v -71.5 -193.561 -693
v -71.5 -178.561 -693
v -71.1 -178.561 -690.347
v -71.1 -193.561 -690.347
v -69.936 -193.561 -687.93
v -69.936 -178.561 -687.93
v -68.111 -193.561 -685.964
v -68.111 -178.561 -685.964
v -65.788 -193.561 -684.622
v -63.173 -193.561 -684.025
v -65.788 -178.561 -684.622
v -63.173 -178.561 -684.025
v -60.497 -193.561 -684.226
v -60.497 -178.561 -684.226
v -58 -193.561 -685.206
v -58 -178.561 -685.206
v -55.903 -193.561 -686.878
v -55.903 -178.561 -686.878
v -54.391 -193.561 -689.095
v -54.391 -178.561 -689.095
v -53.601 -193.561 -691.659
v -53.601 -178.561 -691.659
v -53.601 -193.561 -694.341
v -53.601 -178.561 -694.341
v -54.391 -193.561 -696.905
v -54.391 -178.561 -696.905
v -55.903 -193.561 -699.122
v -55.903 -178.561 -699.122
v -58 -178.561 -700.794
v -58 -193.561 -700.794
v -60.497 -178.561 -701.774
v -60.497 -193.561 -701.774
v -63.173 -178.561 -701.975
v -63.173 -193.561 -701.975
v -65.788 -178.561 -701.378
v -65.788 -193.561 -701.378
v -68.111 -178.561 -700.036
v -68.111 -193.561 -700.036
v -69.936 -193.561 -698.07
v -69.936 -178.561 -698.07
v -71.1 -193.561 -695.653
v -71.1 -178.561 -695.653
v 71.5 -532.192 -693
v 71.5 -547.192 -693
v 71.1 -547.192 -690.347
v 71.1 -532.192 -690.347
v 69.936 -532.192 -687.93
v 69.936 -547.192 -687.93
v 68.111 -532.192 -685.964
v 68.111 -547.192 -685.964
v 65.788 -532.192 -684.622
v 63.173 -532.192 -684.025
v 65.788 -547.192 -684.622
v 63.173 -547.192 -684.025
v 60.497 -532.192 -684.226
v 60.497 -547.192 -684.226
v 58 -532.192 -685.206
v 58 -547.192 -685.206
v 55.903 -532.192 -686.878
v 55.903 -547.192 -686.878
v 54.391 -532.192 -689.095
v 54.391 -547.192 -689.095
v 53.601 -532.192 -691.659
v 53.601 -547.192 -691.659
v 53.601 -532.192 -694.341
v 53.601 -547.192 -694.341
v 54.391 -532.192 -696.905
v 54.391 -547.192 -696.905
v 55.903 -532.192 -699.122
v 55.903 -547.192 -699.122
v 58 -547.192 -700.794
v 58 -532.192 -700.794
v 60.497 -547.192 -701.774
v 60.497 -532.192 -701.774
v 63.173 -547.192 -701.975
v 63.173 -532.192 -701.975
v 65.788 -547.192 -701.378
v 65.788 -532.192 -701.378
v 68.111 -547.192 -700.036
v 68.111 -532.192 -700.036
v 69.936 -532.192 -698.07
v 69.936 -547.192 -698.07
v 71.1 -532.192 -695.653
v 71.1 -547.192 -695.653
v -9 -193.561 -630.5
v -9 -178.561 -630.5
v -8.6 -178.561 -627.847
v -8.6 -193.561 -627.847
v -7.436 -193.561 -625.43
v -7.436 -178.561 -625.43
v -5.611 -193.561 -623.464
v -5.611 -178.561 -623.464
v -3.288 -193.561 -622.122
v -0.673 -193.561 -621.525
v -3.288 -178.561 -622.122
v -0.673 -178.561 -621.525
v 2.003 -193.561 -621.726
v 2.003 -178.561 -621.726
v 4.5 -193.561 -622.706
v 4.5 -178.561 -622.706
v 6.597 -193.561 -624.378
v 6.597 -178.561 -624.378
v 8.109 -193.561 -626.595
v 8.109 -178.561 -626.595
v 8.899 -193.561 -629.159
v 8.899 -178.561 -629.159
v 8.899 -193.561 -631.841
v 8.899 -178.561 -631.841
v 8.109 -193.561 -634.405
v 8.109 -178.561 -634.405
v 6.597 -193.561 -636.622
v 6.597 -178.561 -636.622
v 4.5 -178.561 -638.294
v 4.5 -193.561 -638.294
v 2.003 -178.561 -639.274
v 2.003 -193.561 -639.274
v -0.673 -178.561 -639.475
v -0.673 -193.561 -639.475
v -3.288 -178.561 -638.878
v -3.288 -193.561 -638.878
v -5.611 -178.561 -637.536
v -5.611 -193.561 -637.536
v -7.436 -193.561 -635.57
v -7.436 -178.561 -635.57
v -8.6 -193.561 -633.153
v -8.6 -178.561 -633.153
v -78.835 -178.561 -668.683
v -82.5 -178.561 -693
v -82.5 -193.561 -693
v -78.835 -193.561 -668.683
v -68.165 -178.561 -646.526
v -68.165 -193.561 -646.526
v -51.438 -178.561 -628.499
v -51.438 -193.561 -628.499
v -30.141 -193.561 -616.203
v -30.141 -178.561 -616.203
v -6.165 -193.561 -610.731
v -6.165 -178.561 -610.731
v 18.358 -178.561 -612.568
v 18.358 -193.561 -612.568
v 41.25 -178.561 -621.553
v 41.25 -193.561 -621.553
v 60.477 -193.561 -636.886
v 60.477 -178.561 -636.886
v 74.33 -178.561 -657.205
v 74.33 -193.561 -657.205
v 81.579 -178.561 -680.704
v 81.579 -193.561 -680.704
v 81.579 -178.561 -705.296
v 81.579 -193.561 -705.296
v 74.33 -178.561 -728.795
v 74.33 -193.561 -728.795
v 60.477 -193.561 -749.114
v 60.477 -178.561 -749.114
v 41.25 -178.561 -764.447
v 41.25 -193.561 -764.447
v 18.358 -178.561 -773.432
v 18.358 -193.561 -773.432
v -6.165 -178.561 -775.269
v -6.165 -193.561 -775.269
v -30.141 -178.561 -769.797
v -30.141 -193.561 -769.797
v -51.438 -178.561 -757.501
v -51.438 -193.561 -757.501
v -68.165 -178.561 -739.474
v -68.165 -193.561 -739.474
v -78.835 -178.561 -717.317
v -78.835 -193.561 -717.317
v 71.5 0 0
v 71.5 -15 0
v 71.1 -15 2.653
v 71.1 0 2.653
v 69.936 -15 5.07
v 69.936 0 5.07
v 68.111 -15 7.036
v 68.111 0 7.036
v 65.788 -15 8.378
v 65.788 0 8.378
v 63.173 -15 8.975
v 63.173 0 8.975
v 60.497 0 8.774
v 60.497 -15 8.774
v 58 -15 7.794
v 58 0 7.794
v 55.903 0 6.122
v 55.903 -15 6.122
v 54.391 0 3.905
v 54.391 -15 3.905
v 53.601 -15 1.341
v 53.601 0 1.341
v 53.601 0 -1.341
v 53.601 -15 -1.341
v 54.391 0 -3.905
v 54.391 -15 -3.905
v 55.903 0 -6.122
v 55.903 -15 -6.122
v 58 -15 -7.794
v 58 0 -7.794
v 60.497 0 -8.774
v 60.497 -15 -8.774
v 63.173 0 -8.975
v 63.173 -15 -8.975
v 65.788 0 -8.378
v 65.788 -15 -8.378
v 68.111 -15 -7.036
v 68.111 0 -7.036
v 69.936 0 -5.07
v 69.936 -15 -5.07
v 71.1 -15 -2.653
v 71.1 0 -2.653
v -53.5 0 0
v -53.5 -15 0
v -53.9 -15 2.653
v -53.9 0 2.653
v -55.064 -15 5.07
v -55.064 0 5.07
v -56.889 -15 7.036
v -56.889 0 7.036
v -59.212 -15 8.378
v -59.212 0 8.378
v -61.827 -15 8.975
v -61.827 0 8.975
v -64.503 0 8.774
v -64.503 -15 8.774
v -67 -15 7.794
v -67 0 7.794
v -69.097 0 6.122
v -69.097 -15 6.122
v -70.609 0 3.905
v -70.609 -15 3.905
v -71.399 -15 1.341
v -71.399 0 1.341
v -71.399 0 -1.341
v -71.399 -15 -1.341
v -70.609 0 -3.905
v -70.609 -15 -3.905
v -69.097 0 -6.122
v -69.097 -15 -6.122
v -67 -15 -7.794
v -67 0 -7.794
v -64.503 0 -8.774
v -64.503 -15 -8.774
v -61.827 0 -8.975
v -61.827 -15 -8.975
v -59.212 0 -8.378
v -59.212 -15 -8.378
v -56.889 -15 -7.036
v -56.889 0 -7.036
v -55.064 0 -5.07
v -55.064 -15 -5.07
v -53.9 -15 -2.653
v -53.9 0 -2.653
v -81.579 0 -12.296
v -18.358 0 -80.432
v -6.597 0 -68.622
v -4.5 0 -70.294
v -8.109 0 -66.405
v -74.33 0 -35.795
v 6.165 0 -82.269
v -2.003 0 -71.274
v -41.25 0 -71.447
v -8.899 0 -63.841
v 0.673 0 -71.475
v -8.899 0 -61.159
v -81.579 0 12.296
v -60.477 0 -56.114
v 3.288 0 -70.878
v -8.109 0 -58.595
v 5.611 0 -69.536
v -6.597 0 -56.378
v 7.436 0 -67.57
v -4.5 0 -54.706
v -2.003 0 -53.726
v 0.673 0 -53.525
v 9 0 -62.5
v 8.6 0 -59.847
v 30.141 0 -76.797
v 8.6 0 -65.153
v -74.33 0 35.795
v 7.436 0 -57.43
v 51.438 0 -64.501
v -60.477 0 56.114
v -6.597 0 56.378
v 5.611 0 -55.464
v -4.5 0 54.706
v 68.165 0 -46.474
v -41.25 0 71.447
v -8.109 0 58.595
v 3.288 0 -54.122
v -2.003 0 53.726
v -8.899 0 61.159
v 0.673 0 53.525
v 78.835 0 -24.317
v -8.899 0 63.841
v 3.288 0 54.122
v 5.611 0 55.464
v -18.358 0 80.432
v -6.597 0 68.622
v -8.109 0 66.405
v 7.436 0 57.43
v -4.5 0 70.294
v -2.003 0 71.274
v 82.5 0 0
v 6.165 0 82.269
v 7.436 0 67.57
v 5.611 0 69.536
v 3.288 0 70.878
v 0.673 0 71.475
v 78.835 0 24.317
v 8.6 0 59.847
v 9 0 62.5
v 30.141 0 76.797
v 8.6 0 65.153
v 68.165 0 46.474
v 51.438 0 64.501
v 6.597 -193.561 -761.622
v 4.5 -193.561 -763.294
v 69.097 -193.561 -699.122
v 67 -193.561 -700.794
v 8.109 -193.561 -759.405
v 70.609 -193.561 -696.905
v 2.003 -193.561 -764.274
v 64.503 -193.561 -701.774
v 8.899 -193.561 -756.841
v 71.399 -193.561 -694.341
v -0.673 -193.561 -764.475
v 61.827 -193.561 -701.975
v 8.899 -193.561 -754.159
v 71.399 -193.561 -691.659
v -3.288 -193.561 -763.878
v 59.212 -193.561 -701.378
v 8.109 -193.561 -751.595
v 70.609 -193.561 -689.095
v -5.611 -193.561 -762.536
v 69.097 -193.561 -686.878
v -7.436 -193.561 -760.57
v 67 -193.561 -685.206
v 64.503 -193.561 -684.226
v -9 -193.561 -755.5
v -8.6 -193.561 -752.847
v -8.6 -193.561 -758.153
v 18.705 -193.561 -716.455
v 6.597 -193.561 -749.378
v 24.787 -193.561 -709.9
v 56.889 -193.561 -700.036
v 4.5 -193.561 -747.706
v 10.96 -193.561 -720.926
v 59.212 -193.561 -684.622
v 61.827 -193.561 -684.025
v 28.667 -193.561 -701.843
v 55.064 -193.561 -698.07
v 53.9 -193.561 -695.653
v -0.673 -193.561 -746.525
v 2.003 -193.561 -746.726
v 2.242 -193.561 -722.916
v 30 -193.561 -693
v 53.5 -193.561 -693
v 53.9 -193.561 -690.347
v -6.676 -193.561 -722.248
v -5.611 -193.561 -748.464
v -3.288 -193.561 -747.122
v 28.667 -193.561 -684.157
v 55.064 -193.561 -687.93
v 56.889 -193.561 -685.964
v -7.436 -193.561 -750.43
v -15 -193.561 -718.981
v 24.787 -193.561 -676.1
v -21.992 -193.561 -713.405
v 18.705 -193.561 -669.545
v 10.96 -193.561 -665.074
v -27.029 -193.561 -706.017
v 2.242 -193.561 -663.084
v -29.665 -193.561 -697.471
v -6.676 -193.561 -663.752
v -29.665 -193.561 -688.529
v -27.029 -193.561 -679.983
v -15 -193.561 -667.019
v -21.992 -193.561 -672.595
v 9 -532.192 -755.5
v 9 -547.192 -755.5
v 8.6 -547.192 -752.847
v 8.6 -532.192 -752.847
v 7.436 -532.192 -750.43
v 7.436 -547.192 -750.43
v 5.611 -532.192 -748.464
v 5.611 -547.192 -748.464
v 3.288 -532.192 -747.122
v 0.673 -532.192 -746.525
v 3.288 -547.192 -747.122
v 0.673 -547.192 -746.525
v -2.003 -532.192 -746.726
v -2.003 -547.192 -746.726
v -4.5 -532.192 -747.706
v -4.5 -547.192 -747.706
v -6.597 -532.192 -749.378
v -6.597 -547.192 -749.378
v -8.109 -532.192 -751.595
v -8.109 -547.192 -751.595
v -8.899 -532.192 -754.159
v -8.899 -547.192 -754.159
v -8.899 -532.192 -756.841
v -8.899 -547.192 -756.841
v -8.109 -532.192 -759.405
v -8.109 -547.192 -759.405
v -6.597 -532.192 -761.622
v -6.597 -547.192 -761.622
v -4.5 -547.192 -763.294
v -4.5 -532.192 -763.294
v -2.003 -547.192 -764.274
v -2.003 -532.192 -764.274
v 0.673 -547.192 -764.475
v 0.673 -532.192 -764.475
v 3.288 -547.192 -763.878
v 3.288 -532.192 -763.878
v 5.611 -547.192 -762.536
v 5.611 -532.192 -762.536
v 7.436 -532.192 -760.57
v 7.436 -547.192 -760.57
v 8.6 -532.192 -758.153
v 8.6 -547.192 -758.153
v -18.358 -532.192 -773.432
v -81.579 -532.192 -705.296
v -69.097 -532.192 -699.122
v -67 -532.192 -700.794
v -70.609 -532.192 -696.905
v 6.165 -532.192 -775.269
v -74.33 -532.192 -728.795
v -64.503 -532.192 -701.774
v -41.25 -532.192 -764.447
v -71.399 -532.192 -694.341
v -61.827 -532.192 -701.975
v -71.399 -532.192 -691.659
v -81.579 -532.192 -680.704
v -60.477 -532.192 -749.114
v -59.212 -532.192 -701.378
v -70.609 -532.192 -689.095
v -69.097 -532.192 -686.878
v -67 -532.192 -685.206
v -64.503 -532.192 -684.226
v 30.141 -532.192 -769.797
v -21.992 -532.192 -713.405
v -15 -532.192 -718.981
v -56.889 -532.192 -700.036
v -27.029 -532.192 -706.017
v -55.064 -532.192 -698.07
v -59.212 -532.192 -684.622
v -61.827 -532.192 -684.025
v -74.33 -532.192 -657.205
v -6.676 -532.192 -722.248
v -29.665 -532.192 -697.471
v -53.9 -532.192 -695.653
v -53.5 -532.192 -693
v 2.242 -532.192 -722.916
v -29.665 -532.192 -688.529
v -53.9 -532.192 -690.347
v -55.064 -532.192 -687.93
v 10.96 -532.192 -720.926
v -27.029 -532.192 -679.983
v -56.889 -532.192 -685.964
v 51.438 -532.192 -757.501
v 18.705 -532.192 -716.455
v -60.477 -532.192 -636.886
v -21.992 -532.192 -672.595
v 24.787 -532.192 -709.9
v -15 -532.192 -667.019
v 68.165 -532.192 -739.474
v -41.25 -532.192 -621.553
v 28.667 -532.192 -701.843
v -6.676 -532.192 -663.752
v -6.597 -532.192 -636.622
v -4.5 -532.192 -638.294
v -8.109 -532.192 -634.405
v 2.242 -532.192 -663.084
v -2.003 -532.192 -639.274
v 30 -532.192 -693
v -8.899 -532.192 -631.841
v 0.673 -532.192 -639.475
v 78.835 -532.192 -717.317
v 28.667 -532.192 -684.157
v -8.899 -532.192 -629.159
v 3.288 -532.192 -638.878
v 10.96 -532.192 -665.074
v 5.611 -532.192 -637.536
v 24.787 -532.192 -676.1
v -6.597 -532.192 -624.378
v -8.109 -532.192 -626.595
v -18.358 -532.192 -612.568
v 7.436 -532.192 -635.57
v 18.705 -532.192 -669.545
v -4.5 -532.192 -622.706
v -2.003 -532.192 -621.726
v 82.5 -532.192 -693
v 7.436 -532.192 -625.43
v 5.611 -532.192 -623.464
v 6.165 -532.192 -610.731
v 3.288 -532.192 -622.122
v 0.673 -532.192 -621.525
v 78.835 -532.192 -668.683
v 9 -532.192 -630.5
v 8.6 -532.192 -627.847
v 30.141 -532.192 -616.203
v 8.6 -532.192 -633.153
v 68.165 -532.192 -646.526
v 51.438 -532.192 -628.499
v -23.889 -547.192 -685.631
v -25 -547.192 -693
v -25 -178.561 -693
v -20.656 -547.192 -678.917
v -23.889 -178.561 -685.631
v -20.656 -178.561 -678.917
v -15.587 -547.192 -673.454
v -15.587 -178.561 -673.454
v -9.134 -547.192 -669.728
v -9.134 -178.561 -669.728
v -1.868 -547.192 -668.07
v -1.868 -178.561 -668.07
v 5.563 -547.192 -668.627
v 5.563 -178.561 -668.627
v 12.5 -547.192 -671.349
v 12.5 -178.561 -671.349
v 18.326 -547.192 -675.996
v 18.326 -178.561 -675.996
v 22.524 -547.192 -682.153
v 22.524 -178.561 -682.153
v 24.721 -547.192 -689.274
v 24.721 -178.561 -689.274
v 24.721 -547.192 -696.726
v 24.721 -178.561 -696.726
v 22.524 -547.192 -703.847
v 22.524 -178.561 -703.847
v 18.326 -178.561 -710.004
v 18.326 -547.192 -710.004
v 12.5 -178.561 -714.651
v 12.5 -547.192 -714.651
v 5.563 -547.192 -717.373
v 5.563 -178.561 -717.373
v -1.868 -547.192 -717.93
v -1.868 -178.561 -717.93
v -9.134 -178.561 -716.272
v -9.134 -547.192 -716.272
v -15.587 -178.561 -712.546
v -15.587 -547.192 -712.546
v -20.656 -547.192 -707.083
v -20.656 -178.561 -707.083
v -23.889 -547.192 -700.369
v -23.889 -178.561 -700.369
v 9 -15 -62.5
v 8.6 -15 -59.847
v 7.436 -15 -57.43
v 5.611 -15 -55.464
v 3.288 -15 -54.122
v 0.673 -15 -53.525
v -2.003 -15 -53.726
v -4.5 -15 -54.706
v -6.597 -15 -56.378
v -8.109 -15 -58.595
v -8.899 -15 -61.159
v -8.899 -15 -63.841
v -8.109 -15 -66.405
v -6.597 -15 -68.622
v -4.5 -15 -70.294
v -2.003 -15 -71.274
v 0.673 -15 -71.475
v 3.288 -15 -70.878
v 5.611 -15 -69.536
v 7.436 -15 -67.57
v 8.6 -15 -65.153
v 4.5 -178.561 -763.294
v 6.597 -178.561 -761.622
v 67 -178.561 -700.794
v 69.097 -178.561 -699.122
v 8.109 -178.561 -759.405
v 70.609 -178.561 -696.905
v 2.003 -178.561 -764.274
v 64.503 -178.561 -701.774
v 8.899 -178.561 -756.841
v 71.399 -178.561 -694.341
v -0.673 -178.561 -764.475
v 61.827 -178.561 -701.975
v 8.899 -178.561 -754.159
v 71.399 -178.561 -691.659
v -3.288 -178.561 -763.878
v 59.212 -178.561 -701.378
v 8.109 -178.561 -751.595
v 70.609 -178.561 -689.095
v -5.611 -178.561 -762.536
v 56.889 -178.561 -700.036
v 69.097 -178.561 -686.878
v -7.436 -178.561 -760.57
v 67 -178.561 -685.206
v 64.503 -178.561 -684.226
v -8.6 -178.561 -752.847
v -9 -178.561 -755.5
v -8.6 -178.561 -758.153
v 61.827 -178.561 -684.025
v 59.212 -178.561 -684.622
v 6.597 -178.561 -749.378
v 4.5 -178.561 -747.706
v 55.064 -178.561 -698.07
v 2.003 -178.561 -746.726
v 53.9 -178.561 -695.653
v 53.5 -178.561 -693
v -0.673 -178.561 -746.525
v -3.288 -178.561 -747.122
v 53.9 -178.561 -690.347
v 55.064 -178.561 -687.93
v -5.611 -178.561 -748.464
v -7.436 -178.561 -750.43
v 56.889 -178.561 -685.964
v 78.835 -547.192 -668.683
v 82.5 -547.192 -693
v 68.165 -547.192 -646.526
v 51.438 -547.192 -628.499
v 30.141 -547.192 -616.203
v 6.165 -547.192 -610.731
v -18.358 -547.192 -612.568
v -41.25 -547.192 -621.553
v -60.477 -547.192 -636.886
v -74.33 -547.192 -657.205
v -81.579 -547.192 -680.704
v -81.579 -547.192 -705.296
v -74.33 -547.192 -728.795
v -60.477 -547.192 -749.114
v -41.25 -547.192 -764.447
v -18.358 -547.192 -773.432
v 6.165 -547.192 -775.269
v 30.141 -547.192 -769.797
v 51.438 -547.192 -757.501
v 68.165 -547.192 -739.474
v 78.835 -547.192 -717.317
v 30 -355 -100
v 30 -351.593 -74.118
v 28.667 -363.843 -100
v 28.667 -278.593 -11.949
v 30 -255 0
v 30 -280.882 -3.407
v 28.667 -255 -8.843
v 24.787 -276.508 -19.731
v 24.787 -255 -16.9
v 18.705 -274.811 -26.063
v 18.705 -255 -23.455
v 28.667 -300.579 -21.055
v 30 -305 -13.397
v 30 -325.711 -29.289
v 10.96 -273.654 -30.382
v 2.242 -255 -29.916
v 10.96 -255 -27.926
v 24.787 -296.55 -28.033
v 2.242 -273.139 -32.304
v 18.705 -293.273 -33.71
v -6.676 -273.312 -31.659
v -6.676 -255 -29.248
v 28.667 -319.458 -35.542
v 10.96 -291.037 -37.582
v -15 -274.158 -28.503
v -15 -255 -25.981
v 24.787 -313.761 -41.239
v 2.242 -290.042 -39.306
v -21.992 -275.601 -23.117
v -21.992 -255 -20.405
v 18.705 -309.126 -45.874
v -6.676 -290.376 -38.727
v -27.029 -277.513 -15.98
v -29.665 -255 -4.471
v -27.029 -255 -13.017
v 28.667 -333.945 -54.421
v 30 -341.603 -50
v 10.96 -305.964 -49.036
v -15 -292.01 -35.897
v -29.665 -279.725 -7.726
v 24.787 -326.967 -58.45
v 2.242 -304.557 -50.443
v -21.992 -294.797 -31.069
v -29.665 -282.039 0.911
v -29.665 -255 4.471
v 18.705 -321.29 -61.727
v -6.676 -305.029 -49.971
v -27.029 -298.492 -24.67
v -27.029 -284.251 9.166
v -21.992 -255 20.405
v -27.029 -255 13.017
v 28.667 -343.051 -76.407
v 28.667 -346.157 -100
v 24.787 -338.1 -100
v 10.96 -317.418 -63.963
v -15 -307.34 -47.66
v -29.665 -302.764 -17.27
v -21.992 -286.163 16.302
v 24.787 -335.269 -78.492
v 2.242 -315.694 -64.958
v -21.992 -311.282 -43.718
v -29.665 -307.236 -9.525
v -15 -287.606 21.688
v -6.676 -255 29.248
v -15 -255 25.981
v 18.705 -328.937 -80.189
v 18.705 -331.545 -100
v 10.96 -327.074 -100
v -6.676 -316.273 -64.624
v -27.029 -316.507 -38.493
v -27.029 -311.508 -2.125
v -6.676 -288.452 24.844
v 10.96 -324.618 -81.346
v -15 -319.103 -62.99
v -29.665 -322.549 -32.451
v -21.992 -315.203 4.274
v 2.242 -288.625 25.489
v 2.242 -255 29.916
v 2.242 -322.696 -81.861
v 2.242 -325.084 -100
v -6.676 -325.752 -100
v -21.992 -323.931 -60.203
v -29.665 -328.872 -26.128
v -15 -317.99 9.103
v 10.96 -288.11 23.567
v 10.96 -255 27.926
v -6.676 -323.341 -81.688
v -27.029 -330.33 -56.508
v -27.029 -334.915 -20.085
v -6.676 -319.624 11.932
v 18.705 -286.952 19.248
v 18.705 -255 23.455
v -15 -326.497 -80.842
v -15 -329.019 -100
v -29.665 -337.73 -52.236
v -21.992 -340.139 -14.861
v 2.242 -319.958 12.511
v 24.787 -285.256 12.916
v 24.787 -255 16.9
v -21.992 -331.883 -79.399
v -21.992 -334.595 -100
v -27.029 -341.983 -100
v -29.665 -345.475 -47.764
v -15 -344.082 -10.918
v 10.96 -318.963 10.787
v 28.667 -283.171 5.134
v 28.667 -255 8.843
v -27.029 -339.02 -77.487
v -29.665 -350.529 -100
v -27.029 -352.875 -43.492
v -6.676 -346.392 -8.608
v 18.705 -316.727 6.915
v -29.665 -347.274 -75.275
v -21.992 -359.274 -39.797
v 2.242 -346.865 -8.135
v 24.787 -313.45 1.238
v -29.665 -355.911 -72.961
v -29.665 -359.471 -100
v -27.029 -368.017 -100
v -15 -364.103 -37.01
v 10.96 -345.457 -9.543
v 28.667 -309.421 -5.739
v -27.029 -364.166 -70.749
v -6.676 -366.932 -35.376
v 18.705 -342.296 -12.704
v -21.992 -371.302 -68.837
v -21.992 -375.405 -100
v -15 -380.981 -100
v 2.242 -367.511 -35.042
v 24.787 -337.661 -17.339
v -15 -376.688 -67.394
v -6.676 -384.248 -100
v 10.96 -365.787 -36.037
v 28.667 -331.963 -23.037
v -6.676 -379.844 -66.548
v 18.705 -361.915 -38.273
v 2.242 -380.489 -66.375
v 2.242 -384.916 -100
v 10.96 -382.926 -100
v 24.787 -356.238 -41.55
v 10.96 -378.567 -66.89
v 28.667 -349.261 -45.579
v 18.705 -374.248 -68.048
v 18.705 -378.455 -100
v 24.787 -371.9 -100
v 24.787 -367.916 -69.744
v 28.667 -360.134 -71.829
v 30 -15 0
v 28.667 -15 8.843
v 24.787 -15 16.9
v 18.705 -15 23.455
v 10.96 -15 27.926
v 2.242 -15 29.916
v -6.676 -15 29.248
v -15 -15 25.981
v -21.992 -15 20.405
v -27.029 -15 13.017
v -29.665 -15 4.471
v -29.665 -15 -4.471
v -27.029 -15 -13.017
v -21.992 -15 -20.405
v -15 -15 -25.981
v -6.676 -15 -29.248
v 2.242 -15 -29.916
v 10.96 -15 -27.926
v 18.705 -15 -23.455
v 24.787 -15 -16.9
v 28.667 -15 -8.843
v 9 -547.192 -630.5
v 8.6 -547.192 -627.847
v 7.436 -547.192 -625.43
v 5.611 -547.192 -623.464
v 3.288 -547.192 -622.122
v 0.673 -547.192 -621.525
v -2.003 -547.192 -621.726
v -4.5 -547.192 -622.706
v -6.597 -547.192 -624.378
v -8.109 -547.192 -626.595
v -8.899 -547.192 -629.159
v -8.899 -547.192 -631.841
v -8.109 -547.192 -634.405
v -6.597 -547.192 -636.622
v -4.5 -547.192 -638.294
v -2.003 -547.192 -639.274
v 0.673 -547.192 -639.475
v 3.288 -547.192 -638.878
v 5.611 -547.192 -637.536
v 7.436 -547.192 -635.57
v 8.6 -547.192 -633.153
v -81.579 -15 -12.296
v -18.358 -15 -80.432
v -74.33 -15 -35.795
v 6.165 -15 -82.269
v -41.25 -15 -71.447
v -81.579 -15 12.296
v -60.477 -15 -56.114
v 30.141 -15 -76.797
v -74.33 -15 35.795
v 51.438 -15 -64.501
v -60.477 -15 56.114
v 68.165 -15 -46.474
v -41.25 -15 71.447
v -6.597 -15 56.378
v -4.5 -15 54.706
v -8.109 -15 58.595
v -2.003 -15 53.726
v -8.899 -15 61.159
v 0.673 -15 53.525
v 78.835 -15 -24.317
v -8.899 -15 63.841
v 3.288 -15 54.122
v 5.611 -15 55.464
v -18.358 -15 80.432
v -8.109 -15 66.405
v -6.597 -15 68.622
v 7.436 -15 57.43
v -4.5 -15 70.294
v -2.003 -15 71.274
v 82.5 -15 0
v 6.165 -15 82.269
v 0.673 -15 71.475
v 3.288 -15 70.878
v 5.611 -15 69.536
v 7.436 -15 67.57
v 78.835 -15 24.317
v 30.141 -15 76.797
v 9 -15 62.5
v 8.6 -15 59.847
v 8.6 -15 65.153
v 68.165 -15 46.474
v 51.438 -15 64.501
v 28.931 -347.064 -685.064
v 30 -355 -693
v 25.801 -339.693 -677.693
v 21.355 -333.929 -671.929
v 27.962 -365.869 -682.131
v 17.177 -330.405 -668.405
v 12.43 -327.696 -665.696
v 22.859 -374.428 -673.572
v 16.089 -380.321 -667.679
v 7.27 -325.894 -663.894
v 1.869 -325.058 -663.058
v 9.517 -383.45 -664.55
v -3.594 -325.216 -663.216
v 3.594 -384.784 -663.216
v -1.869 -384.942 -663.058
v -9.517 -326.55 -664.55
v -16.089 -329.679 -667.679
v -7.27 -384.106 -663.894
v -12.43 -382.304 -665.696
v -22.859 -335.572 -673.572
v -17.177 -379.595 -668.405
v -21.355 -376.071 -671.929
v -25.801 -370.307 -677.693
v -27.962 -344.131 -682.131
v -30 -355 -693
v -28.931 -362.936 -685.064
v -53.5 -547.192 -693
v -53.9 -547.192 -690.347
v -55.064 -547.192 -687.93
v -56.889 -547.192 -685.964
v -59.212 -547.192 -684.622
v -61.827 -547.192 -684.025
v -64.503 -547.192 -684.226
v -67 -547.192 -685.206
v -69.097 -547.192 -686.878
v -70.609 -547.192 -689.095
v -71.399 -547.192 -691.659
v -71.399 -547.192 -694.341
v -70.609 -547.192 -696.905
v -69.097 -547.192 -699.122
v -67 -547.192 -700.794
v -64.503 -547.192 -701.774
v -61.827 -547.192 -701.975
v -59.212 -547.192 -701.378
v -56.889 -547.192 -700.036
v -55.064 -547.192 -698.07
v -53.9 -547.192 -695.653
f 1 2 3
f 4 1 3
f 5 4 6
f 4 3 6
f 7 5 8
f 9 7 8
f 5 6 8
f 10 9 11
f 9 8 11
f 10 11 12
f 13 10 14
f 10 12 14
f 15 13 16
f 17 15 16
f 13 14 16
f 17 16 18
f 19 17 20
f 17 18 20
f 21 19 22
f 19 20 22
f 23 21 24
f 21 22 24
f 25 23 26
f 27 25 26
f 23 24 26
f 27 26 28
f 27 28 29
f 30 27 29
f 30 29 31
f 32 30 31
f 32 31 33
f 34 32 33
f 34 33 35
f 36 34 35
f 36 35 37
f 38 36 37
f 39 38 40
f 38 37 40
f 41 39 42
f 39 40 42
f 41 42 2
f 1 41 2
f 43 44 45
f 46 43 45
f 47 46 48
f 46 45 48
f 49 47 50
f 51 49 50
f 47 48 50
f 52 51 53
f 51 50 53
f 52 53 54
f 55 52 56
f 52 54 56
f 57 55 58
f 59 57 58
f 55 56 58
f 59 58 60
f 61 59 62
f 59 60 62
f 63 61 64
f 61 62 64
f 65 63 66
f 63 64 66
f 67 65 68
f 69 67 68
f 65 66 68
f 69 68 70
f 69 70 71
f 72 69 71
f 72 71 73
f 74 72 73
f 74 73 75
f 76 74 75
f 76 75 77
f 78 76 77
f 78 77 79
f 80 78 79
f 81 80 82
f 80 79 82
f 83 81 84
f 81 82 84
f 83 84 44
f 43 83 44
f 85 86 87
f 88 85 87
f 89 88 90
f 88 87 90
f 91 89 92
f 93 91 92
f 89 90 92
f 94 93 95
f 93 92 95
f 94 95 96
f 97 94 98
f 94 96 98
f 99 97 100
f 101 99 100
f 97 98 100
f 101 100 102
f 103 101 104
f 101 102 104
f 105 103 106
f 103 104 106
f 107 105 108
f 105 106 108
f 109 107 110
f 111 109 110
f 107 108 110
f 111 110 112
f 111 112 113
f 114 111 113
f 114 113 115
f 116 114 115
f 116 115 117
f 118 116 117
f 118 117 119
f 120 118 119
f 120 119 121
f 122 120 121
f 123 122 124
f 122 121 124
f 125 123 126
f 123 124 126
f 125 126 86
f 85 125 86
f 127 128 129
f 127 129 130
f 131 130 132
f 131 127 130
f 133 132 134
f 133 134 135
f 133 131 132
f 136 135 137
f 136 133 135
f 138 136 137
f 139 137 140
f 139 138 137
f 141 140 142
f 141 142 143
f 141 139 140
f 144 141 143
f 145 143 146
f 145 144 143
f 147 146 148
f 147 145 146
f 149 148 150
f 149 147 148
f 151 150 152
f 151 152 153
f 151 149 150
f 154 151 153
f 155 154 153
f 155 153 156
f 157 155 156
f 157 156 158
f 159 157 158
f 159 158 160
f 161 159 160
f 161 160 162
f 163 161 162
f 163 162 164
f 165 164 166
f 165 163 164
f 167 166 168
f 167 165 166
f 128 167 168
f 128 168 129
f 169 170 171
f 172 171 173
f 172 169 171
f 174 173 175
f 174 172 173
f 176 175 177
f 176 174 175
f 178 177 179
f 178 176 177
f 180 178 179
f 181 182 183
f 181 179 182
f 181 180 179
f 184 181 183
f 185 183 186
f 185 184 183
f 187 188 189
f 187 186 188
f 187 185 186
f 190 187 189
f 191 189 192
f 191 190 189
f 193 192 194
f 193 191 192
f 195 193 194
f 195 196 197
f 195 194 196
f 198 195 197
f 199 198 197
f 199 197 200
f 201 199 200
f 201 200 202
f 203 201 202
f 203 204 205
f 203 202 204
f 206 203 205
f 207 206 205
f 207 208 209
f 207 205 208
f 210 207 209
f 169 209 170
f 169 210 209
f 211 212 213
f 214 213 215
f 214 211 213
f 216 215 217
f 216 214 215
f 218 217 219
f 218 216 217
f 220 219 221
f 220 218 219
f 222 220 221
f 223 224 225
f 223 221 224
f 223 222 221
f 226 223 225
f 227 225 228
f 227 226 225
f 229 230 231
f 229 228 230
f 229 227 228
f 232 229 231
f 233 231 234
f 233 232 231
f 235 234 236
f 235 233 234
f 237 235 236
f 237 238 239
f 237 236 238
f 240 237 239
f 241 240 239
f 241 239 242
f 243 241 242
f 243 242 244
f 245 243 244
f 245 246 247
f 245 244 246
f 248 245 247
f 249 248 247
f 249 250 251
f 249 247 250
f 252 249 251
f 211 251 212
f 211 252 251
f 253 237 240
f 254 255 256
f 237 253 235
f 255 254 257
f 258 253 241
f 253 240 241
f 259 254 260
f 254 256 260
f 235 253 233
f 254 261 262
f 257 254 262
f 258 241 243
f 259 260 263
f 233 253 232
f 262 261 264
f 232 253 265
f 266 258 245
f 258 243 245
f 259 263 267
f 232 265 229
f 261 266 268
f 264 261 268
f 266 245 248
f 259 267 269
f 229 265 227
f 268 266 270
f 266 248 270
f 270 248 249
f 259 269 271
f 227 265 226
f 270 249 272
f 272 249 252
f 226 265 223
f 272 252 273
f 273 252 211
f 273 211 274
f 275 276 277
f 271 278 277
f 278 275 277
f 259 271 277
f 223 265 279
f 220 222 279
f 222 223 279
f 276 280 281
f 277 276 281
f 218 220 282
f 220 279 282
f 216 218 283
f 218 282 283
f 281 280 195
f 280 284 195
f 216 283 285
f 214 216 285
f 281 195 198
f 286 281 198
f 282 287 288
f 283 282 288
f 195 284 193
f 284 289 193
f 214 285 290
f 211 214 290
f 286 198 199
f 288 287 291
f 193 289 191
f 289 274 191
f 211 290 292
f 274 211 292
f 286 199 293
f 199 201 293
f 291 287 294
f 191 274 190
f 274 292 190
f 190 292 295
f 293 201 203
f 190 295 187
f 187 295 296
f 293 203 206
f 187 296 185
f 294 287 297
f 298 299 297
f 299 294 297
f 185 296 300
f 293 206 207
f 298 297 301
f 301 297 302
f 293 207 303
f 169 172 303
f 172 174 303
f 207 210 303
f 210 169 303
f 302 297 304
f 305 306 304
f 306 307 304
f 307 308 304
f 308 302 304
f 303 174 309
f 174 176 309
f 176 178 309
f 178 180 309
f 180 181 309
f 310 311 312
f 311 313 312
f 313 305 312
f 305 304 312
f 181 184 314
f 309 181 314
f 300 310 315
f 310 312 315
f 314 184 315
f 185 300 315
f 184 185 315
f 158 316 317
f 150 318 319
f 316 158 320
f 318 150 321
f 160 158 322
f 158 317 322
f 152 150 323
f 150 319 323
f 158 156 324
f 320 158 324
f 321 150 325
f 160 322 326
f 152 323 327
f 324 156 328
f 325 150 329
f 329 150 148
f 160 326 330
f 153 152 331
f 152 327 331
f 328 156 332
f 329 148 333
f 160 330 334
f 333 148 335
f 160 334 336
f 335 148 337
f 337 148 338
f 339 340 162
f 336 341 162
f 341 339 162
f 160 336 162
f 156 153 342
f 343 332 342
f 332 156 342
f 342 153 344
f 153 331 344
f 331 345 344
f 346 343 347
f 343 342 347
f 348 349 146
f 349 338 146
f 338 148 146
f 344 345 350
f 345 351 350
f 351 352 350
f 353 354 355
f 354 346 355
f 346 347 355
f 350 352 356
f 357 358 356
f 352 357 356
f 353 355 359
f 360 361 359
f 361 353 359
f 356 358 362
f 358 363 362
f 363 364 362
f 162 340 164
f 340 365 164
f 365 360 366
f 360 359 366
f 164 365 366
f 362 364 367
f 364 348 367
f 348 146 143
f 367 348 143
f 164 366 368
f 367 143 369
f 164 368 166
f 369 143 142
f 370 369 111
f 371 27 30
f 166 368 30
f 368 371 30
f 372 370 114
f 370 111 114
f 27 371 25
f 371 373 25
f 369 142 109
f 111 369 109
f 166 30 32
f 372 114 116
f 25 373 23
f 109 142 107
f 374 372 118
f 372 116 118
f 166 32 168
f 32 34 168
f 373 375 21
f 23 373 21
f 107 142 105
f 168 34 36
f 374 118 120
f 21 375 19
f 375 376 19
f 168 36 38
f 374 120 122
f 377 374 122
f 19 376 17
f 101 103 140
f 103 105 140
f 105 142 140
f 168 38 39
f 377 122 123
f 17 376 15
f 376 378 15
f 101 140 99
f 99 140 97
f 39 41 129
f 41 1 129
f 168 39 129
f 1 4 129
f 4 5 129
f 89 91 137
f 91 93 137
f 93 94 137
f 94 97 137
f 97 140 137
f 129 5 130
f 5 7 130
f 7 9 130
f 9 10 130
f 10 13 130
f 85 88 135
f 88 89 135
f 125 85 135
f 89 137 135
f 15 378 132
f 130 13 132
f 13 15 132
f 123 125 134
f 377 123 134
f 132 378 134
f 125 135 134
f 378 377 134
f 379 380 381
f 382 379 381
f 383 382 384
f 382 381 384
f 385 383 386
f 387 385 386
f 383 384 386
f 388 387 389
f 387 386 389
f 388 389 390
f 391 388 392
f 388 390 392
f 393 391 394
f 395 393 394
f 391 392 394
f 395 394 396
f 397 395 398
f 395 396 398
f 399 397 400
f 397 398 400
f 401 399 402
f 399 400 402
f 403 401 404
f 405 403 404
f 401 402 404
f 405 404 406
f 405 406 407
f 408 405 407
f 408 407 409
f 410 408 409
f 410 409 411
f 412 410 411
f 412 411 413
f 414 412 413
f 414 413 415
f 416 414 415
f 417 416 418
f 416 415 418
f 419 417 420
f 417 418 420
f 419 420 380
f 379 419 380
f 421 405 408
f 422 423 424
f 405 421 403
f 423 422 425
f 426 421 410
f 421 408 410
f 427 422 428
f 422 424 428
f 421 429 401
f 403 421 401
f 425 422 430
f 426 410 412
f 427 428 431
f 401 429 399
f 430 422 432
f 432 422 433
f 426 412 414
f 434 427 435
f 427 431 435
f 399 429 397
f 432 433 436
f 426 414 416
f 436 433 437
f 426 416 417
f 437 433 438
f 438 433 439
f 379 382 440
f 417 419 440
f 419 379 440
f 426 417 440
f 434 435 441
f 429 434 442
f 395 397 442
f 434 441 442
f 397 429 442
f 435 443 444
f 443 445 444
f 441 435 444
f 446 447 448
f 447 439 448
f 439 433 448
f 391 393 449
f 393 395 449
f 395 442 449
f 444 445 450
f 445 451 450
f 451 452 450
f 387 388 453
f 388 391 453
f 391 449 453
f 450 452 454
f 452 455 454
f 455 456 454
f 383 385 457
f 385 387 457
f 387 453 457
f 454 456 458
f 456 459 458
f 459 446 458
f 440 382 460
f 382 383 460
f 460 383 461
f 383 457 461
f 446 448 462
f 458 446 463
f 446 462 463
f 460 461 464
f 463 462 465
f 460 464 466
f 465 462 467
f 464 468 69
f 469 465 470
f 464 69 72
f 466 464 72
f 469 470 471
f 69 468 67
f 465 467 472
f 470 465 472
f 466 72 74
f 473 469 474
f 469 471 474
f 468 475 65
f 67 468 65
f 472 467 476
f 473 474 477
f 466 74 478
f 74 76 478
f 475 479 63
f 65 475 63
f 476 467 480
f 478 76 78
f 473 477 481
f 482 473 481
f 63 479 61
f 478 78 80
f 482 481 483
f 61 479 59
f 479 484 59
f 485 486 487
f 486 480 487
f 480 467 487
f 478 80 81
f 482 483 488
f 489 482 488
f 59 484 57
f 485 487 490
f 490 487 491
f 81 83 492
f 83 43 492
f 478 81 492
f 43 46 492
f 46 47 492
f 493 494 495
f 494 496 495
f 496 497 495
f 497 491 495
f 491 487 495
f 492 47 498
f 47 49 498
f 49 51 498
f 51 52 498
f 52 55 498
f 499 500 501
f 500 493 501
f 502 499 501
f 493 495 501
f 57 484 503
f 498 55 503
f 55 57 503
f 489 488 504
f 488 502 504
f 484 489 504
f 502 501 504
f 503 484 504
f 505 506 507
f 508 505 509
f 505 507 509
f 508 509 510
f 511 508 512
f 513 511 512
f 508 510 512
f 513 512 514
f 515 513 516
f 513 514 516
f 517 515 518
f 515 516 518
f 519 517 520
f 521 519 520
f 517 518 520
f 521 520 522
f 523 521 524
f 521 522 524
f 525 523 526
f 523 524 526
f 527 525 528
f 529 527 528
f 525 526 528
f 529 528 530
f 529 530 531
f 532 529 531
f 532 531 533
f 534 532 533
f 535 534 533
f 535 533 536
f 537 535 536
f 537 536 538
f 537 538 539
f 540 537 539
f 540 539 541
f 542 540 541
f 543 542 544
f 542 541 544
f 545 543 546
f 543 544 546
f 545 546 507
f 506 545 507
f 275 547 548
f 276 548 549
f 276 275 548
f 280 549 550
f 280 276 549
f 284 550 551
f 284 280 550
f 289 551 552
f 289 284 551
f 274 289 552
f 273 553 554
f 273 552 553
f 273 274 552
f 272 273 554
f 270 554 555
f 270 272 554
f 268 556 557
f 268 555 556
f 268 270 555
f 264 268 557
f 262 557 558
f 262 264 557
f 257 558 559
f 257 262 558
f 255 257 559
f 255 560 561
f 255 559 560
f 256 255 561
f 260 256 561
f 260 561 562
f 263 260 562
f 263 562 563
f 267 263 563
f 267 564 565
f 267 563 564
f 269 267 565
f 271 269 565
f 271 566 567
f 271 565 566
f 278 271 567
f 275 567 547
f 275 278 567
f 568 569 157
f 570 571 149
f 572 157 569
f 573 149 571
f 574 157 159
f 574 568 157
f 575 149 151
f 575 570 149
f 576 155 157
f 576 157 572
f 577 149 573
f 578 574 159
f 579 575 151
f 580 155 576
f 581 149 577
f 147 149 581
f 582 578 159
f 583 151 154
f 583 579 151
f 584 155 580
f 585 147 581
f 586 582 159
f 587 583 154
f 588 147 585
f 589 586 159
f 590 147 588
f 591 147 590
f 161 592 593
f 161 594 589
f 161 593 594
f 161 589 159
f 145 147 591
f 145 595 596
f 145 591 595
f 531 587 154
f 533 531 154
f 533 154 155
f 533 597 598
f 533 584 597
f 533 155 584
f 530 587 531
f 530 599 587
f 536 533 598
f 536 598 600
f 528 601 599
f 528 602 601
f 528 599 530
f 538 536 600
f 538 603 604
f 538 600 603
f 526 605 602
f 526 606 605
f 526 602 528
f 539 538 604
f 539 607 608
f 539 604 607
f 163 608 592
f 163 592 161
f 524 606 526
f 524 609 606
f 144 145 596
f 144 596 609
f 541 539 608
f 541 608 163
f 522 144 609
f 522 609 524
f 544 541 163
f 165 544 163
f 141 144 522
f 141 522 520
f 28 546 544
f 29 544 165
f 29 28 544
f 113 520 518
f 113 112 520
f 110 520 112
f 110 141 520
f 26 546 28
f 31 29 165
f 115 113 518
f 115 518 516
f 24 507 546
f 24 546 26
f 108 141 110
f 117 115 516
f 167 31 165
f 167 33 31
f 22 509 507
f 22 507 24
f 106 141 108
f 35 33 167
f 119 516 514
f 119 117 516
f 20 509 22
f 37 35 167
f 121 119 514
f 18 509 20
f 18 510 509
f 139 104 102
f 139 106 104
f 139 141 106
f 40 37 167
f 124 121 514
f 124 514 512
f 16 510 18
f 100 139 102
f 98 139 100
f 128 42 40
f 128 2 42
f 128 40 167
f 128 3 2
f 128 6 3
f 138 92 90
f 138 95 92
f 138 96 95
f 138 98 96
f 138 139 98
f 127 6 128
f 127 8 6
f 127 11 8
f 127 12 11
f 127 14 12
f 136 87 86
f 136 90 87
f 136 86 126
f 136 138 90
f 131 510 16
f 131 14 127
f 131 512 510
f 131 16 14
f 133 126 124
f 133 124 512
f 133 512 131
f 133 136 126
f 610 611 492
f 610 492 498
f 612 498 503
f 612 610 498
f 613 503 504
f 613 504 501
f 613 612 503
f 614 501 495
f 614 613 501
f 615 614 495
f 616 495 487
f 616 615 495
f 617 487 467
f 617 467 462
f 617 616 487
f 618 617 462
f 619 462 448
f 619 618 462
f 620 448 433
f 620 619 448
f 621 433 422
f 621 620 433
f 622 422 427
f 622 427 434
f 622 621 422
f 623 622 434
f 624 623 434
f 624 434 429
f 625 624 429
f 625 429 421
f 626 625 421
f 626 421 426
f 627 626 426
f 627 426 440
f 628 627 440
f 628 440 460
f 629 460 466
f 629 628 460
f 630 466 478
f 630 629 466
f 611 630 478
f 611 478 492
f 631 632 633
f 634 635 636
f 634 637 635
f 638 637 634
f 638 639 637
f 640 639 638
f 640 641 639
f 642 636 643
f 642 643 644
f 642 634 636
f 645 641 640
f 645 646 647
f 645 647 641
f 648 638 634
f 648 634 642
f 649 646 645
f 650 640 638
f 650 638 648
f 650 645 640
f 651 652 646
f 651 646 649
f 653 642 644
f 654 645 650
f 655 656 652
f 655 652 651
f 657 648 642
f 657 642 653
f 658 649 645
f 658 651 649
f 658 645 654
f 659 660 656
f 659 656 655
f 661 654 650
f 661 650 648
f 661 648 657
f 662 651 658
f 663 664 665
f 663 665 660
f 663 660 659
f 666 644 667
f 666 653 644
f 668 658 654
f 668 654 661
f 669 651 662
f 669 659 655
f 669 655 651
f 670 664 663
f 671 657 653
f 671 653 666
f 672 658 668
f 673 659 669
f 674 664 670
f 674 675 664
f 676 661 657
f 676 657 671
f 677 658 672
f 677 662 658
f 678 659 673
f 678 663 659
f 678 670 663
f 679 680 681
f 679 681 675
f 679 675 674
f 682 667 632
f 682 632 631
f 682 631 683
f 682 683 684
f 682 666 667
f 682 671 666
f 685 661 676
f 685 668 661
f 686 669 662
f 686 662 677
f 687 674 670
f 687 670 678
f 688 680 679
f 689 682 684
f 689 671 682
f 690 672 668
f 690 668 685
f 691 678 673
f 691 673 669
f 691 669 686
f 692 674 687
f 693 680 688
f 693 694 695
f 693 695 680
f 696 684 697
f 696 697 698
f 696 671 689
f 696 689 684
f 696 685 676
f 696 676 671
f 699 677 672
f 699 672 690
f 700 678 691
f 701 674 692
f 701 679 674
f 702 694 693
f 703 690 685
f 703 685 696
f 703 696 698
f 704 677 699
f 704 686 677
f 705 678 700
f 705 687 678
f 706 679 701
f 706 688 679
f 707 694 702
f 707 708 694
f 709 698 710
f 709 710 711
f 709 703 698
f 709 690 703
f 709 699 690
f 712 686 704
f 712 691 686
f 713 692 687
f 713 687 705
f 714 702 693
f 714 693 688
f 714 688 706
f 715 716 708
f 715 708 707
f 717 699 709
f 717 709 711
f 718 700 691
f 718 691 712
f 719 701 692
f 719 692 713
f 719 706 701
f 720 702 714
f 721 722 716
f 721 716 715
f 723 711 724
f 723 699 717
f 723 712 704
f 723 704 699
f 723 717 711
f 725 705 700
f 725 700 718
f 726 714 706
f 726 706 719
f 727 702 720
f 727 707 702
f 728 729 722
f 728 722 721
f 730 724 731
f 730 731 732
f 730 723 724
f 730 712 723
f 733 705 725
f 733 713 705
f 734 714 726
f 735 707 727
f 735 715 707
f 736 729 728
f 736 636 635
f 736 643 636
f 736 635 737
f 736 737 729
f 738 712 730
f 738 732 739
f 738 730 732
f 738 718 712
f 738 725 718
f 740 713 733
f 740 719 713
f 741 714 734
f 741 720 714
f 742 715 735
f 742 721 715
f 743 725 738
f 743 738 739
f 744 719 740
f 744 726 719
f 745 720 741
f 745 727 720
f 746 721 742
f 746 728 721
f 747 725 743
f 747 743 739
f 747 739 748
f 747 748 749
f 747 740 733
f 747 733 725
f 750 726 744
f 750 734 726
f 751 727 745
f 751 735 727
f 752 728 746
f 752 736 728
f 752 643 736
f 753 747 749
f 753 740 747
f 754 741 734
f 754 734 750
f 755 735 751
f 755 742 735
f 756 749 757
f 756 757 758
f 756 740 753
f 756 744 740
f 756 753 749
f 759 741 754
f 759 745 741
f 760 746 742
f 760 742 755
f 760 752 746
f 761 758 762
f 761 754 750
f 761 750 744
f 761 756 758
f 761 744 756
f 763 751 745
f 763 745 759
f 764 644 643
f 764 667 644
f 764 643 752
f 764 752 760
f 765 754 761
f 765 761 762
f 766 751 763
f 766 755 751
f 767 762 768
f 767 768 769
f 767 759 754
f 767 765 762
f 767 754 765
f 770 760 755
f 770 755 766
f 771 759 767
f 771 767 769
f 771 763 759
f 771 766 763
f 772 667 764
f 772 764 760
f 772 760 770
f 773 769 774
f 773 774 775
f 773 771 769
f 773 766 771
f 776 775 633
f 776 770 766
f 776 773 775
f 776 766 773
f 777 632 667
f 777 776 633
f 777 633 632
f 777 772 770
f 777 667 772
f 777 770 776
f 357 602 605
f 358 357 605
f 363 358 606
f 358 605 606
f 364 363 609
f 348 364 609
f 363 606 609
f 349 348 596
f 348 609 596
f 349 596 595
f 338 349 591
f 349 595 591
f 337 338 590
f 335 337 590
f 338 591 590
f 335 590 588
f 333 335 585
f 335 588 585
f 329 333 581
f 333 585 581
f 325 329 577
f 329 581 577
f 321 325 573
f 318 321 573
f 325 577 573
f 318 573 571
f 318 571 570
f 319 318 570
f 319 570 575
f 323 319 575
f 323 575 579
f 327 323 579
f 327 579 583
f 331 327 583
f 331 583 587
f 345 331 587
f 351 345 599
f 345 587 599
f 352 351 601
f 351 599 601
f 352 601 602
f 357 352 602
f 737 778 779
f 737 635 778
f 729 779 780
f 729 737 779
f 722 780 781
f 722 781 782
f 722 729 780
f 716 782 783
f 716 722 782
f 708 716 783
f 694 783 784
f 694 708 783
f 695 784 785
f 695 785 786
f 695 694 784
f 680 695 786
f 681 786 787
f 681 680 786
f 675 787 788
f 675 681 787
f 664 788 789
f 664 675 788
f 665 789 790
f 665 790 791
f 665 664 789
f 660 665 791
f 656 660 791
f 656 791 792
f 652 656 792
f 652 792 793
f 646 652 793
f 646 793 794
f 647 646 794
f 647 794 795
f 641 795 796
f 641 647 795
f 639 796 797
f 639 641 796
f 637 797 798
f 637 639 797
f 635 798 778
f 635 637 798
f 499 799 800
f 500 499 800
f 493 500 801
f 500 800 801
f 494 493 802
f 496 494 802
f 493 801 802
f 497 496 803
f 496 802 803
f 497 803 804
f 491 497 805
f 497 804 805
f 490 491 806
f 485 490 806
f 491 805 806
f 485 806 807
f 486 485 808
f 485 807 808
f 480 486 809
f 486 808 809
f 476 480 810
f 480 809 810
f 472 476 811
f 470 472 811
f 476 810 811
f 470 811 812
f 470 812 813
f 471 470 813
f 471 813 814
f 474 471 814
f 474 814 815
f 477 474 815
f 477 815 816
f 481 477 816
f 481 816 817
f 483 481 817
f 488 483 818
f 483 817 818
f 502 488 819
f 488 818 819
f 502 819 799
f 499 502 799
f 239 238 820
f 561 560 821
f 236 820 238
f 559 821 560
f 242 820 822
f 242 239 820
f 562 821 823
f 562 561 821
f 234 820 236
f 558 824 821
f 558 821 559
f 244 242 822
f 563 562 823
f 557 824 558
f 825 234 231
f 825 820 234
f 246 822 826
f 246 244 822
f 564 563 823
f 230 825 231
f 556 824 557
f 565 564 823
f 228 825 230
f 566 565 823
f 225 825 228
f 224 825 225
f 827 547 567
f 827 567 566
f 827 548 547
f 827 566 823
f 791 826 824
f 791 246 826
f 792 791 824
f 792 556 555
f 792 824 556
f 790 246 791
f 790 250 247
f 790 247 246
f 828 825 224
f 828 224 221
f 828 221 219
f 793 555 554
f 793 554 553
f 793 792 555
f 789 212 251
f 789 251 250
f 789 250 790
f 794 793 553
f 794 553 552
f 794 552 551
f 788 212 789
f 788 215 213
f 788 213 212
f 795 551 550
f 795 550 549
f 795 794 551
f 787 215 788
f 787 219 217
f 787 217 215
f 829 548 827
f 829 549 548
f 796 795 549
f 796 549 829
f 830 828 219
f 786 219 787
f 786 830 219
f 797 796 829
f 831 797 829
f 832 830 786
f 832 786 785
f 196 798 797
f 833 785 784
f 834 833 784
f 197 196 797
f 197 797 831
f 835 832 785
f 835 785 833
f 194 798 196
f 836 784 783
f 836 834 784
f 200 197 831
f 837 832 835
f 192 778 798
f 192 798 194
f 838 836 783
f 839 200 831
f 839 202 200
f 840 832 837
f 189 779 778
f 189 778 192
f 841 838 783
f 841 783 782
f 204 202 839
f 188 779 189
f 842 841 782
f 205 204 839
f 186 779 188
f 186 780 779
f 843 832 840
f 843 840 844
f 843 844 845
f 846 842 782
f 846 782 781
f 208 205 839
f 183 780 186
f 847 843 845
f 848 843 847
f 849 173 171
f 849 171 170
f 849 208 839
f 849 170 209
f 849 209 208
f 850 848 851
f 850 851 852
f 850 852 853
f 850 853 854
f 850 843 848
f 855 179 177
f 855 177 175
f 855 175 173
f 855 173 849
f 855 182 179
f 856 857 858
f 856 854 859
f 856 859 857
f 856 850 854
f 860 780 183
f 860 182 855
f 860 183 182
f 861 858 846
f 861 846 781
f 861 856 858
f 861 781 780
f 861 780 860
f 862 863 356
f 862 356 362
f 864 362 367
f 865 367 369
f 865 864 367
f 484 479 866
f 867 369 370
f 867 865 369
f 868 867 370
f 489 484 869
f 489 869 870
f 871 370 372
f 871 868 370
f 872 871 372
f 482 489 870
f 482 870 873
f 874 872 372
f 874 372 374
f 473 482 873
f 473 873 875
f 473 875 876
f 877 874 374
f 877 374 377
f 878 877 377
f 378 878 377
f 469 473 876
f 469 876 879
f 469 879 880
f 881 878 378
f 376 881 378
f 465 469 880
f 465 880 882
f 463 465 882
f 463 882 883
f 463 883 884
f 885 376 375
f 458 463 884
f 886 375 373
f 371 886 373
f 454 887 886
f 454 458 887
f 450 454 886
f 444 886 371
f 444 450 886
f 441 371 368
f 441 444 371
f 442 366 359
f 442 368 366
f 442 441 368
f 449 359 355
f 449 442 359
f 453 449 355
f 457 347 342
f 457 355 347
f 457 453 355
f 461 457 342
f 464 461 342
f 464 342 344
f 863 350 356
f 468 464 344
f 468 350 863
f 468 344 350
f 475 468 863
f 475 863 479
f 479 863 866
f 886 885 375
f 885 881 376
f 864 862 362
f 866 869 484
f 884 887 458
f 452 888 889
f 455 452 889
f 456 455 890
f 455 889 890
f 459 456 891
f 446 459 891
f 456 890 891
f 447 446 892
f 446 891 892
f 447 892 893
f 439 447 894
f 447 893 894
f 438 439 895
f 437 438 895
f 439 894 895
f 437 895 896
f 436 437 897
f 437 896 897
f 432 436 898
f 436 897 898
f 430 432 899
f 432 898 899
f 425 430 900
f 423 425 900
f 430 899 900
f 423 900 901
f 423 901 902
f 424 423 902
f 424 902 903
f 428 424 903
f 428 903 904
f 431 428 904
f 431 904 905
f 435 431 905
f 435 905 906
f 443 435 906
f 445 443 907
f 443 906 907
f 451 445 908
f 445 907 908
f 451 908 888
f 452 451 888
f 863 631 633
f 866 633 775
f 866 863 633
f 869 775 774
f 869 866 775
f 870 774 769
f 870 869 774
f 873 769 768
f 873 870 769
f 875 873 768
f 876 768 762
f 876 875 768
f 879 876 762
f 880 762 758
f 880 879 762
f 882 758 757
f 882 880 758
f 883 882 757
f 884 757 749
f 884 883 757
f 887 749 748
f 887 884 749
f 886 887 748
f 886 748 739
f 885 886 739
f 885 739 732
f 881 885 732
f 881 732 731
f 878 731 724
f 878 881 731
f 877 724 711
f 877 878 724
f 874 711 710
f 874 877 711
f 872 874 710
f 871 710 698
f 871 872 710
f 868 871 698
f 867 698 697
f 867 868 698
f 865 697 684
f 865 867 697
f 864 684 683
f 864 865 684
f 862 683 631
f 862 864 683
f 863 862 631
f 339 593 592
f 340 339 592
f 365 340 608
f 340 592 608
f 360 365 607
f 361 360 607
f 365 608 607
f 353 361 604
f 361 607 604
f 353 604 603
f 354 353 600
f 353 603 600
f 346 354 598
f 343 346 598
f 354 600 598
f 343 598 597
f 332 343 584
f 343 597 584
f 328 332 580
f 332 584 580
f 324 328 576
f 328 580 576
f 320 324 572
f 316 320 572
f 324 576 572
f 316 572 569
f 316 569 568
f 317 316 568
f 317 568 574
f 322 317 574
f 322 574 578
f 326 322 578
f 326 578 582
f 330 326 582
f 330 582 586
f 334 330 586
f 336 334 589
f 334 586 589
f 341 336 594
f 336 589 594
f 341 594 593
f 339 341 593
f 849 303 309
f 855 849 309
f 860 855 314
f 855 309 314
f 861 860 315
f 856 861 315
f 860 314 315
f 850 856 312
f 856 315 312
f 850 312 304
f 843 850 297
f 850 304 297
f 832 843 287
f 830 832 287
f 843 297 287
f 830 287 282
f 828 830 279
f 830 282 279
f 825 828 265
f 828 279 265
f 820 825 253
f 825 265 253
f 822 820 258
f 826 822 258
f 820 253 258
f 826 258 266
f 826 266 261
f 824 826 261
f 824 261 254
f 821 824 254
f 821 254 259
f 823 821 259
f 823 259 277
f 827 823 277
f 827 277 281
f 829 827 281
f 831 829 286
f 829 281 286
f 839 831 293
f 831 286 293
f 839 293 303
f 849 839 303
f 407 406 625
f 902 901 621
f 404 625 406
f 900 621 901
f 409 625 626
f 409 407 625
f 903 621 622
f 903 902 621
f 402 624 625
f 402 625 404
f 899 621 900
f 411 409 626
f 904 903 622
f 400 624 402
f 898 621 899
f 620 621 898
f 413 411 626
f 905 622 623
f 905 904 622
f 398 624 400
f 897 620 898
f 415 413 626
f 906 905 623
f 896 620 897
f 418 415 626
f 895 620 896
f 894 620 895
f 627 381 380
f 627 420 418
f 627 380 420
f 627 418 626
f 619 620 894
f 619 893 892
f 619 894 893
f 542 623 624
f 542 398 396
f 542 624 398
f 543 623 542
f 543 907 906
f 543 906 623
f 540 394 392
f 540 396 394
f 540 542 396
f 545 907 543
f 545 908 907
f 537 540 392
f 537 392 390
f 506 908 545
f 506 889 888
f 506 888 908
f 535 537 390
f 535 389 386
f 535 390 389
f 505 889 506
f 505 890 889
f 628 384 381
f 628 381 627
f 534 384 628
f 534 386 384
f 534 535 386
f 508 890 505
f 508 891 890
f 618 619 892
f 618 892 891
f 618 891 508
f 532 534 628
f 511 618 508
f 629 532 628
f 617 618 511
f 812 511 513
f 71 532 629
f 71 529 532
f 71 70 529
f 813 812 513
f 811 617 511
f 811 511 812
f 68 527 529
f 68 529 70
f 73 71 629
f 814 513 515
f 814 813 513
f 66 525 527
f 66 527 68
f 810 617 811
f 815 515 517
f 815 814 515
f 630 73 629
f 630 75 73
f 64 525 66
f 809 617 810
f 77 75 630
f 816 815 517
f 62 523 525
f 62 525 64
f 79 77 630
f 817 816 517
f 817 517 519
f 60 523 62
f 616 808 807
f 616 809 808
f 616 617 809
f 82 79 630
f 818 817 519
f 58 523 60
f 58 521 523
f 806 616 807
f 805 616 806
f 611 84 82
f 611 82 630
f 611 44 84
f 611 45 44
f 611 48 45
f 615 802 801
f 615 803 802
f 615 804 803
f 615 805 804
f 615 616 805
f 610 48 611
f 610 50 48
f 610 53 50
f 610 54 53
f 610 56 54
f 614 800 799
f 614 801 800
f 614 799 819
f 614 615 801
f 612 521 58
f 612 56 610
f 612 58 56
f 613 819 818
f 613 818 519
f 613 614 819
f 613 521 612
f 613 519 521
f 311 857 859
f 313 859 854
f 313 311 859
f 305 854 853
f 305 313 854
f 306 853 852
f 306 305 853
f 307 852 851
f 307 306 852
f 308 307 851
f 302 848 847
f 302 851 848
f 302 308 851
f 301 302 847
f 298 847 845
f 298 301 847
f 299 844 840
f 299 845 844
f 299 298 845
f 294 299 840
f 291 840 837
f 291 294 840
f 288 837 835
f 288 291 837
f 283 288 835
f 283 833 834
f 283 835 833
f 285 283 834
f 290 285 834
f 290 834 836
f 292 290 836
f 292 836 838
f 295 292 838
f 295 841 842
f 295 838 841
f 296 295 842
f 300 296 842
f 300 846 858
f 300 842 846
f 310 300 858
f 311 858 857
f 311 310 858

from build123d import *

# Parameters (mm, degrees)
F0_R      = 30
F3_R      = 30
F0_R_2    = 82.5
F5_DEPTH  = 15
F6_R      = 9
F7_DEPTH  = 25
F8_R      = 82.5
F8_R_2    = 9
F8_R_3    = 30
F9_DEPTH  = 15
F10_R     = 82.5
F10_R_2   = 9
F10_R_3   = 30
F11_DEPTH = 15
F12_R     = 25
F13_DEPTH = 368.6303645372


with BuildPart() as f2:
    # F2: sweep along a path in F1
    with BuildLine(Plane.YZ) as f2_path:
        Line((0, 0), (-255, 0))
        ThreePointArc((-255, 0), (-325.7106781187, -29.2893218813), (-355, -100))
        Line((-355, -100), (-355, -693))
        Line((-355, -693), (-547.1918582916, -693))
    # F0 (on Front) → F2 (sweep)
    with BuildSketch(Plane.XZ):
        Circle(F0_R)
    sweep(path=f2_path.line, transition=Transition.RIGHT)

    # F4: sweep along a path in F1
    with BuildLine(Plane.YZ) as f4_path:
        Line((-547.1918582916, -693), (-355, -693))
        Line((-355, -693), (-178.5614937544, -693))
    # F3 (on face) → F4 (sweep)
    with BuildSketch(Plane.XZ.offset(547.1918582916)):
        with Locations((0, -693)):
            Circle(F3_R)
    sweep(path=f4_path.line)

    # F0 (on Front) → F5 (join)
    with BuildSketch(Plane.XZ):
        Circle(F0_R_2)
        Circle(F0_R, mode=Mode.SUBTRACT)
    extrude(amount=F5_DEPTH)

    # F6 (on face) → F7 (cut)
    with BuildSketch(Plane.XZ):
        with Locations((0, 62.5)):
            Circle(F6_R)
        with Locations((-62.5, 0)):
            Circle(F6_R)
        with Locations((0, -62.5)):
            Circle(F6_R)
        with Locations((62.5, 0)):
            Circle(F6_R)
    extrude(amount=F7_DEPTH, mode=Mode.SUBTRACT)

    # F8 (on face) → F9 (join)
    with BuildSketch(Plane.XZ.offset(547.1918582916)):
        with Locations((0, -693)):
            Circle(F8_R)
        with Locations((0, -755.5)):
            Circle(F8_R_2, mode=Mode.SUBTRACT)
        with Locations((-62.5, -693)):
            Circle(F8_R_2, mode=Mode.SUBTRACT)
        with Locations((0, -693)):
            Circle(F8_R_3, mode=Mode.SUBTRACT)
        with Locations((62.5, -693)):
            Circle(F8_R_2, mode=Mode.SUBTRACT)
        with Locations((0, -630.5)):
            Circle(F8_R_2, mode=Mode.SUBTRACT)
    extrude(amount=-F9_DEPTH)

    # F10 (on face) → F11 (join)
    with BuildSketch(Plane(origin=(0, -178.5614937544, 0), x_dir=(-1, 0, 0), z_dir=(0, 1, 0))):
        with Locations((0, -693)):
            Circle(F10_R)
        with Locations((0, -755.5)):
            Circle(F10_R_2, mode=Mode.SUBTRACT)
        with Locations((-62.5, -693)):
            Circle(F10_R_2, mode=Mode.SUBTRACT)
        with Locations((0, -693)):
            Circle(F10_R_3, mode=Mode.SUBTRACT)
        with Locations((62.5, -693)):
            Circle(F10_R_2, mode=Mode.SUBTRACT)
        with Locations((0, -630.5)):
            Circle(F10_R_2, mode=Mode.SUBTRACT)
    extrude(amount=-F11_DEPTH)

    # F12 (on face) → F13 (cut, through all)
    with BuildSketch(Plane(origin=(0, -178.5614937544, 0), x_dir=(-1, 0, 0), z_dir=(0, 1, 0))):
        with Locations((0, -693)):
            Circle(F12_R)
    extrude(amount=-F13_DEPTH, mode=Mode.SUBTRACT)


solid = f2.part
